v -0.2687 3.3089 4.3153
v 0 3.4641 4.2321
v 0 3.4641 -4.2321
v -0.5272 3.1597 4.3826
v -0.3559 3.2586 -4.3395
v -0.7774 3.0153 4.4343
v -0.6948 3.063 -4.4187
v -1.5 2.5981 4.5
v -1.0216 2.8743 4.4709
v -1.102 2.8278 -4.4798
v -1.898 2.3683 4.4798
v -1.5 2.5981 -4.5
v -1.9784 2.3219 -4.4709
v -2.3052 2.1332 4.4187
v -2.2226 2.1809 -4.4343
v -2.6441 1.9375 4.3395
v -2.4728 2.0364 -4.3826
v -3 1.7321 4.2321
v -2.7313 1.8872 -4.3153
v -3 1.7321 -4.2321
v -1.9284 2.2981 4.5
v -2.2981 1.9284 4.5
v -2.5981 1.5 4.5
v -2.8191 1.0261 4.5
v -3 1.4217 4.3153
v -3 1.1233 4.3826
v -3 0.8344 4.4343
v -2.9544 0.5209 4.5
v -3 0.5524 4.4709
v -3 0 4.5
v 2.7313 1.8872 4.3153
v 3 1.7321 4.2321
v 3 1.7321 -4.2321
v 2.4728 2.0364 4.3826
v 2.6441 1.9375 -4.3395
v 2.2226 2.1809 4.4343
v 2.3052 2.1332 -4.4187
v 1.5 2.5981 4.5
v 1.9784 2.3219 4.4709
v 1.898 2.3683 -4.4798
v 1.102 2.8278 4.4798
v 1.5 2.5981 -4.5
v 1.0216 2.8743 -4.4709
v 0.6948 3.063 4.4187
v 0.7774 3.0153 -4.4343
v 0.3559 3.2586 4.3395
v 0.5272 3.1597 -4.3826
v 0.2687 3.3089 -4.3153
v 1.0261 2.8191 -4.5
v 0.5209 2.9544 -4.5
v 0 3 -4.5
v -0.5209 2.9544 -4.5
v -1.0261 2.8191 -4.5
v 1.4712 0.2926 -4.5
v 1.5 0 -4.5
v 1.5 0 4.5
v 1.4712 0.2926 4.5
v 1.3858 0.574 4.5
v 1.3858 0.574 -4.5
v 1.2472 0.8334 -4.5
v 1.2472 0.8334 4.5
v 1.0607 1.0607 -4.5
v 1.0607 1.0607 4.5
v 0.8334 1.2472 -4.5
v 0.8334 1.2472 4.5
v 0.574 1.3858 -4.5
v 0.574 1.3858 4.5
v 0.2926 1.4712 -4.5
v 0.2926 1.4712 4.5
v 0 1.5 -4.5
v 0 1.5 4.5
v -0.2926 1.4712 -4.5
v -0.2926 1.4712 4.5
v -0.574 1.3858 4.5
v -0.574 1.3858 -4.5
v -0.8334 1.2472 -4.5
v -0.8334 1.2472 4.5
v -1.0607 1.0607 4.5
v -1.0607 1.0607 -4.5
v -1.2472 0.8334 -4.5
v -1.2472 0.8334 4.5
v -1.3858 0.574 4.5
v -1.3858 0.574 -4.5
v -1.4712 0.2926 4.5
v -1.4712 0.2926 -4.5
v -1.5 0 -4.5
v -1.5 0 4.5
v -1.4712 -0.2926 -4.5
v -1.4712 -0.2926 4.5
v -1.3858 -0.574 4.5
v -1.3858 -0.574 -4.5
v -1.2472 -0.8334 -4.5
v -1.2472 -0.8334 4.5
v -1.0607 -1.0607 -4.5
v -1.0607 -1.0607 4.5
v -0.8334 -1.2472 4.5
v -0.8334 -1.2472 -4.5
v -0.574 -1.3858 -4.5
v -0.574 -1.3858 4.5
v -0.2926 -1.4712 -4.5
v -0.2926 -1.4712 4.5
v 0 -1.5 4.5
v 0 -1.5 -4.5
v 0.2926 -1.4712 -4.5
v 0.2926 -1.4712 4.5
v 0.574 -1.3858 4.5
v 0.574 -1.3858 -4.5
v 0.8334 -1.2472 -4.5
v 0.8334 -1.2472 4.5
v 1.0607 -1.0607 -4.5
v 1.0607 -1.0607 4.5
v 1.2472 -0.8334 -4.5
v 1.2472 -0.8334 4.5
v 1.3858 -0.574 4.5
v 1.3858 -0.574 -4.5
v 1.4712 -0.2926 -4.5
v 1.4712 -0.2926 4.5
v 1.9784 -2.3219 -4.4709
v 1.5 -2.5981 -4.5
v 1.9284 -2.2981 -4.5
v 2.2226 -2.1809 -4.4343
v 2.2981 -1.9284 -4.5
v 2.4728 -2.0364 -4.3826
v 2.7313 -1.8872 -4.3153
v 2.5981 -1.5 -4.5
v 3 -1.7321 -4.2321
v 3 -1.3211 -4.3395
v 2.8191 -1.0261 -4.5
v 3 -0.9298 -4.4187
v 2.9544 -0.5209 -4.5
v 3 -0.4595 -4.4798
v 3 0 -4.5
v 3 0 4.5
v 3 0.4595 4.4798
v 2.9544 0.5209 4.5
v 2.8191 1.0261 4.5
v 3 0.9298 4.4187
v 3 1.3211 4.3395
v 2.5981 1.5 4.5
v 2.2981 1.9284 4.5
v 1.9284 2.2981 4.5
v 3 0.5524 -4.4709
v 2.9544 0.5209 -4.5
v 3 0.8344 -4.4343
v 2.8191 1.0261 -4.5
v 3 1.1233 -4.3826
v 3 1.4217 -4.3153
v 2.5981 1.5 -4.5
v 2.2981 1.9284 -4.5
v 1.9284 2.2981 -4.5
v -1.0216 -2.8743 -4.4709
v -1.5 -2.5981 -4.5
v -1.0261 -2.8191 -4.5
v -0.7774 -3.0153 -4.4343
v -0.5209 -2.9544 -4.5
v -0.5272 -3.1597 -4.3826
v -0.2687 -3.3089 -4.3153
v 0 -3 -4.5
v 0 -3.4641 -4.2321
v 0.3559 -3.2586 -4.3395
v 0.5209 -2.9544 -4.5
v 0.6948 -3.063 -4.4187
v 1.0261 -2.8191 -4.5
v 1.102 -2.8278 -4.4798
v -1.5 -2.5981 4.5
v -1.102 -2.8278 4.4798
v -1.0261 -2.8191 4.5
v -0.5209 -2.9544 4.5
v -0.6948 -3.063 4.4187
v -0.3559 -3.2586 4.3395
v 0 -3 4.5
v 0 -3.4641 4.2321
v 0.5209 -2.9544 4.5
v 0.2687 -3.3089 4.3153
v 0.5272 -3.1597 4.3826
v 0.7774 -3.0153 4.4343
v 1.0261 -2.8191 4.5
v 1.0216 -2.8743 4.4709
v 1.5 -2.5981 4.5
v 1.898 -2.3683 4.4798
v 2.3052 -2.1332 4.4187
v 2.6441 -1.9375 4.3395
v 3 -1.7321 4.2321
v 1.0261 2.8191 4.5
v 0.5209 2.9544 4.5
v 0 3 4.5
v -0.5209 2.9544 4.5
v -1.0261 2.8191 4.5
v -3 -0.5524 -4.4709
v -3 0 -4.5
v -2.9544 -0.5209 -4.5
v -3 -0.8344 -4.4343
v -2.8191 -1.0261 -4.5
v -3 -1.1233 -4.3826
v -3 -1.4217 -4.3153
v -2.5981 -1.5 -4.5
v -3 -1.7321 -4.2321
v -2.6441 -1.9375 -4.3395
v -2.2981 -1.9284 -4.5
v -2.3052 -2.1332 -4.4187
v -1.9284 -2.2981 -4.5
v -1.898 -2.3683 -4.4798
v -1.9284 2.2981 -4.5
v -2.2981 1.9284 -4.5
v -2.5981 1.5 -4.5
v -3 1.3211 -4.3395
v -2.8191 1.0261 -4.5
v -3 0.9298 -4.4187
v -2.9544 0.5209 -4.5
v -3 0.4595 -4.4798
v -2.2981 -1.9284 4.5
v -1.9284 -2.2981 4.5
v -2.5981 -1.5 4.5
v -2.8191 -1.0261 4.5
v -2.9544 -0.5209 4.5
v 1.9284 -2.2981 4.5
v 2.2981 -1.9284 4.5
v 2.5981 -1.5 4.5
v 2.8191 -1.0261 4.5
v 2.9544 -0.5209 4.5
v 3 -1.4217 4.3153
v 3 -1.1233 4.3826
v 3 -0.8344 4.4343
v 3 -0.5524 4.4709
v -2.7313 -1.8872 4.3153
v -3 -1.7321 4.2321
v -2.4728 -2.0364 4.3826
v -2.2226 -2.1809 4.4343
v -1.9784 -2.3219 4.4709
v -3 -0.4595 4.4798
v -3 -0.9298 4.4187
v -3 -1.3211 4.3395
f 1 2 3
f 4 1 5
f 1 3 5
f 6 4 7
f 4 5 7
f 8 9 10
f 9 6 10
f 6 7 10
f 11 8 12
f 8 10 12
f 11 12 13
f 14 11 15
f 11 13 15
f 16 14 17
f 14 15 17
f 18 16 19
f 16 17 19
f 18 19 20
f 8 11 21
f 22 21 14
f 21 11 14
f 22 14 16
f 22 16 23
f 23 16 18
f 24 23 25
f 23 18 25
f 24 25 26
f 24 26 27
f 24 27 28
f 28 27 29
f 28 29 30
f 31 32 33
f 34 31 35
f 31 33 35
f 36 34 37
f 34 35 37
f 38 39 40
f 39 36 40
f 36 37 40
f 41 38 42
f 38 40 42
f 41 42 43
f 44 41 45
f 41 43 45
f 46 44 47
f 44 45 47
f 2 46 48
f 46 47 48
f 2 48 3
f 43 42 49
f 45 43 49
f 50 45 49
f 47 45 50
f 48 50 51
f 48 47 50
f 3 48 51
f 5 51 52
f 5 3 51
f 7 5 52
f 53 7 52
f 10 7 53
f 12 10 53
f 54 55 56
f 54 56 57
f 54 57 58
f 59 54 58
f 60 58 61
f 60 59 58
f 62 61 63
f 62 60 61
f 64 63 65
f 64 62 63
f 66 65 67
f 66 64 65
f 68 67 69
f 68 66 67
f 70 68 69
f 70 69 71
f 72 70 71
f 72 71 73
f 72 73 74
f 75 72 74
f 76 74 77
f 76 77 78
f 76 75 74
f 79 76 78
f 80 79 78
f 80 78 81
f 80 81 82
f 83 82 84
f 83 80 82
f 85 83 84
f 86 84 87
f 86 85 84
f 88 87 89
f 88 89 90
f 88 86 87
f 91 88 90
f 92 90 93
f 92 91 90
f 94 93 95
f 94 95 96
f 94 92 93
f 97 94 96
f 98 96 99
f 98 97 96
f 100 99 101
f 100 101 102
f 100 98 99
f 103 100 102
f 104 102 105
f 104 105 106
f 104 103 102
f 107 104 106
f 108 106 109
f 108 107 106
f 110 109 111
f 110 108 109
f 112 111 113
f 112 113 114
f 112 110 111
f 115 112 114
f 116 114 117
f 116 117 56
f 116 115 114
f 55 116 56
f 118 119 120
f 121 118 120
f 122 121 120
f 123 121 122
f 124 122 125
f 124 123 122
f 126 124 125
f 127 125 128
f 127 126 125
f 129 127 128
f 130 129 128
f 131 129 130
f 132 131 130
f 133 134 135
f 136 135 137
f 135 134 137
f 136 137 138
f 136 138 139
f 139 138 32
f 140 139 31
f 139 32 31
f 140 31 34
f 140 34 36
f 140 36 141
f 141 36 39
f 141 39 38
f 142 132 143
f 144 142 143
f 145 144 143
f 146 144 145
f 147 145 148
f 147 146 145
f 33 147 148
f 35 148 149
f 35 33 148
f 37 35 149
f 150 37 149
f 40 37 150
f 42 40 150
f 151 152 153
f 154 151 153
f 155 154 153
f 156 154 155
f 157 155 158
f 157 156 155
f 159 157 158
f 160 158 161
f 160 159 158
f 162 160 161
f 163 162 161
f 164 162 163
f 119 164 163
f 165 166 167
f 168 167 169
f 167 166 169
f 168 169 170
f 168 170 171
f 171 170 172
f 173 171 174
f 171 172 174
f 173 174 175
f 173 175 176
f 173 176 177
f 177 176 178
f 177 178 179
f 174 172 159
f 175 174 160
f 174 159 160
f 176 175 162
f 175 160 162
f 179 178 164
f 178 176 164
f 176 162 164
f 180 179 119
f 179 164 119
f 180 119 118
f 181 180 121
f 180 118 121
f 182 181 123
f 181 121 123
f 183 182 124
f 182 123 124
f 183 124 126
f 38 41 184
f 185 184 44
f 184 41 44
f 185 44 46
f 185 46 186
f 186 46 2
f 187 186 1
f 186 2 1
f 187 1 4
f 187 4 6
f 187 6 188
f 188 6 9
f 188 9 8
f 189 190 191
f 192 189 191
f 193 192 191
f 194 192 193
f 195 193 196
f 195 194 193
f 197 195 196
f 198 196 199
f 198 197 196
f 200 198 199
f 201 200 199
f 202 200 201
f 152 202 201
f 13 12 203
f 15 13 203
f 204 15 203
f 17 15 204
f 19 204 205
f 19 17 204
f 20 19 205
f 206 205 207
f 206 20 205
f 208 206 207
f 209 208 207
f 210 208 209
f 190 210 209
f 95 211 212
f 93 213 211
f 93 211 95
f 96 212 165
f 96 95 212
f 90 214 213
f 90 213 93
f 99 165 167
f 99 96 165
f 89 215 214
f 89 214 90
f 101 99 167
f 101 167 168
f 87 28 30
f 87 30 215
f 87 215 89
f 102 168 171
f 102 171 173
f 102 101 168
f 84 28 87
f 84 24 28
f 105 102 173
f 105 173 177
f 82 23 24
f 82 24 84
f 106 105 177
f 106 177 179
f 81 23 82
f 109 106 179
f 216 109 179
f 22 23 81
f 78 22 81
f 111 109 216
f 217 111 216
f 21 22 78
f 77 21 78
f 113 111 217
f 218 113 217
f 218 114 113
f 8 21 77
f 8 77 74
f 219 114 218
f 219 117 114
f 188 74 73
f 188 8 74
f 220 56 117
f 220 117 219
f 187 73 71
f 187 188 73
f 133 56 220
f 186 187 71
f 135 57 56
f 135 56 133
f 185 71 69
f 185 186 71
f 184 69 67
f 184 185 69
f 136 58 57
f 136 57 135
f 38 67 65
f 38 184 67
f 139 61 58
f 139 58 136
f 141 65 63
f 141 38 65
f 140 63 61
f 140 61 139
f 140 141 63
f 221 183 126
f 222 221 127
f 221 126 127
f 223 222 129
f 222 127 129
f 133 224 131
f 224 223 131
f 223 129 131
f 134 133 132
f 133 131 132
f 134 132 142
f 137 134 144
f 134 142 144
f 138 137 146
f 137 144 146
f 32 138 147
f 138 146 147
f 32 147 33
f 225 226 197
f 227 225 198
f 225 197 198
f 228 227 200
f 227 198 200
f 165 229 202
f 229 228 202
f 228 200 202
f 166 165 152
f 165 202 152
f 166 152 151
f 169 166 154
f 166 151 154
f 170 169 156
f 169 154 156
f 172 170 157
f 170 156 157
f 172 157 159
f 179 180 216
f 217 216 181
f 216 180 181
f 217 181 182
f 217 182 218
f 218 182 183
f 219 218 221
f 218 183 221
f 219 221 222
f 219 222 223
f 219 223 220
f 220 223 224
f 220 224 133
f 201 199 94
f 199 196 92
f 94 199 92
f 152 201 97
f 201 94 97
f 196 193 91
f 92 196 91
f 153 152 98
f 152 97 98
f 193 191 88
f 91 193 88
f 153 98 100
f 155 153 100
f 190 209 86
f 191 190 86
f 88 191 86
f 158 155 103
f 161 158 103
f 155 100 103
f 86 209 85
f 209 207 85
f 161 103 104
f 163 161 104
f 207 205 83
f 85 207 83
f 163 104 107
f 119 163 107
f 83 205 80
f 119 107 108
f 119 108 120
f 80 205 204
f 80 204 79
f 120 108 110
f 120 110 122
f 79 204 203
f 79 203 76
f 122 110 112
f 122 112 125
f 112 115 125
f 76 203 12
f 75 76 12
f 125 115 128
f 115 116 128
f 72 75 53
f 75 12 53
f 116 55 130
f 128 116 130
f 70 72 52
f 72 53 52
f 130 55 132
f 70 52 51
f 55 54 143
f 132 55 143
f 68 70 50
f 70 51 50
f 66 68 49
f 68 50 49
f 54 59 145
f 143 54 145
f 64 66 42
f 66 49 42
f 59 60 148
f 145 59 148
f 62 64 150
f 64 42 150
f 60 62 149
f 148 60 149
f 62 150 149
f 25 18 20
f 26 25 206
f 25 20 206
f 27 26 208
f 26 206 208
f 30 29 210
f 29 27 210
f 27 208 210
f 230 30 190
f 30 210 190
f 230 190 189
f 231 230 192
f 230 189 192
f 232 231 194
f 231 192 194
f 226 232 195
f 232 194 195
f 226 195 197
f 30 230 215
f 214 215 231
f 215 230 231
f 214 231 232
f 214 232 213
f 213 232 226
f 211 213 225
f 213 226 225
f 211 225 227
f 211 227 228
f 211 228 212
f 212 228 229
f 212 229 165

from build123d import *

# Parameters (mm, degrees)
BOSS_EXTRUDE1_DEPTH      = 4.5
BOSS_EXTRUDE1_DEPTH_BACK = 4.5
SKETCH3_R                = 1.5


# Read off the part's stored shape, not the designer's step: Cut-Extrude1
with BuildPart() as part:
    # Sketch3 → Boss-Extrude1 (new, two sides: drawn at the far end of the back side and taken through both)
    with BuildSketch(Plane.XY.offset(-BOSS_EXTRUDE1_DEPTH_BACK)):
        Polygon((0, 3.464101615), (-3, 1.732050808), (-3, -1.732050808), (0, -3.464101615), (3, -1.732050808), (3, 1.732050808), align=None)
        Circle(SKETCH3_R, mode=Mode.SUBTRACT)
    extrude(amount=BOSS_EXTRUDE1_DEPTH + BOSS_EXTRUDE1_DEPTH_BACK)

    # Cut-Extrude1 outline → Cut-Extrude1 (revolve, cut)
    with BuildSketch(Plane.XZ):
        Polygon((3.464101616, 4.5), (3, 4.5), (3.464101609, 4.232050811), align=None)
    cut_extrude1 = revolve(axis=Axis((0, 0, 0), (0, 0, 1)), mode=Mode.SUBTRACT)

    # Mirror1: Cut-Extrude1 across plane
    add(cut_extrude1.mirror(Plane.XY), mode=Mode.SUBTRACT)


solid = part.part
